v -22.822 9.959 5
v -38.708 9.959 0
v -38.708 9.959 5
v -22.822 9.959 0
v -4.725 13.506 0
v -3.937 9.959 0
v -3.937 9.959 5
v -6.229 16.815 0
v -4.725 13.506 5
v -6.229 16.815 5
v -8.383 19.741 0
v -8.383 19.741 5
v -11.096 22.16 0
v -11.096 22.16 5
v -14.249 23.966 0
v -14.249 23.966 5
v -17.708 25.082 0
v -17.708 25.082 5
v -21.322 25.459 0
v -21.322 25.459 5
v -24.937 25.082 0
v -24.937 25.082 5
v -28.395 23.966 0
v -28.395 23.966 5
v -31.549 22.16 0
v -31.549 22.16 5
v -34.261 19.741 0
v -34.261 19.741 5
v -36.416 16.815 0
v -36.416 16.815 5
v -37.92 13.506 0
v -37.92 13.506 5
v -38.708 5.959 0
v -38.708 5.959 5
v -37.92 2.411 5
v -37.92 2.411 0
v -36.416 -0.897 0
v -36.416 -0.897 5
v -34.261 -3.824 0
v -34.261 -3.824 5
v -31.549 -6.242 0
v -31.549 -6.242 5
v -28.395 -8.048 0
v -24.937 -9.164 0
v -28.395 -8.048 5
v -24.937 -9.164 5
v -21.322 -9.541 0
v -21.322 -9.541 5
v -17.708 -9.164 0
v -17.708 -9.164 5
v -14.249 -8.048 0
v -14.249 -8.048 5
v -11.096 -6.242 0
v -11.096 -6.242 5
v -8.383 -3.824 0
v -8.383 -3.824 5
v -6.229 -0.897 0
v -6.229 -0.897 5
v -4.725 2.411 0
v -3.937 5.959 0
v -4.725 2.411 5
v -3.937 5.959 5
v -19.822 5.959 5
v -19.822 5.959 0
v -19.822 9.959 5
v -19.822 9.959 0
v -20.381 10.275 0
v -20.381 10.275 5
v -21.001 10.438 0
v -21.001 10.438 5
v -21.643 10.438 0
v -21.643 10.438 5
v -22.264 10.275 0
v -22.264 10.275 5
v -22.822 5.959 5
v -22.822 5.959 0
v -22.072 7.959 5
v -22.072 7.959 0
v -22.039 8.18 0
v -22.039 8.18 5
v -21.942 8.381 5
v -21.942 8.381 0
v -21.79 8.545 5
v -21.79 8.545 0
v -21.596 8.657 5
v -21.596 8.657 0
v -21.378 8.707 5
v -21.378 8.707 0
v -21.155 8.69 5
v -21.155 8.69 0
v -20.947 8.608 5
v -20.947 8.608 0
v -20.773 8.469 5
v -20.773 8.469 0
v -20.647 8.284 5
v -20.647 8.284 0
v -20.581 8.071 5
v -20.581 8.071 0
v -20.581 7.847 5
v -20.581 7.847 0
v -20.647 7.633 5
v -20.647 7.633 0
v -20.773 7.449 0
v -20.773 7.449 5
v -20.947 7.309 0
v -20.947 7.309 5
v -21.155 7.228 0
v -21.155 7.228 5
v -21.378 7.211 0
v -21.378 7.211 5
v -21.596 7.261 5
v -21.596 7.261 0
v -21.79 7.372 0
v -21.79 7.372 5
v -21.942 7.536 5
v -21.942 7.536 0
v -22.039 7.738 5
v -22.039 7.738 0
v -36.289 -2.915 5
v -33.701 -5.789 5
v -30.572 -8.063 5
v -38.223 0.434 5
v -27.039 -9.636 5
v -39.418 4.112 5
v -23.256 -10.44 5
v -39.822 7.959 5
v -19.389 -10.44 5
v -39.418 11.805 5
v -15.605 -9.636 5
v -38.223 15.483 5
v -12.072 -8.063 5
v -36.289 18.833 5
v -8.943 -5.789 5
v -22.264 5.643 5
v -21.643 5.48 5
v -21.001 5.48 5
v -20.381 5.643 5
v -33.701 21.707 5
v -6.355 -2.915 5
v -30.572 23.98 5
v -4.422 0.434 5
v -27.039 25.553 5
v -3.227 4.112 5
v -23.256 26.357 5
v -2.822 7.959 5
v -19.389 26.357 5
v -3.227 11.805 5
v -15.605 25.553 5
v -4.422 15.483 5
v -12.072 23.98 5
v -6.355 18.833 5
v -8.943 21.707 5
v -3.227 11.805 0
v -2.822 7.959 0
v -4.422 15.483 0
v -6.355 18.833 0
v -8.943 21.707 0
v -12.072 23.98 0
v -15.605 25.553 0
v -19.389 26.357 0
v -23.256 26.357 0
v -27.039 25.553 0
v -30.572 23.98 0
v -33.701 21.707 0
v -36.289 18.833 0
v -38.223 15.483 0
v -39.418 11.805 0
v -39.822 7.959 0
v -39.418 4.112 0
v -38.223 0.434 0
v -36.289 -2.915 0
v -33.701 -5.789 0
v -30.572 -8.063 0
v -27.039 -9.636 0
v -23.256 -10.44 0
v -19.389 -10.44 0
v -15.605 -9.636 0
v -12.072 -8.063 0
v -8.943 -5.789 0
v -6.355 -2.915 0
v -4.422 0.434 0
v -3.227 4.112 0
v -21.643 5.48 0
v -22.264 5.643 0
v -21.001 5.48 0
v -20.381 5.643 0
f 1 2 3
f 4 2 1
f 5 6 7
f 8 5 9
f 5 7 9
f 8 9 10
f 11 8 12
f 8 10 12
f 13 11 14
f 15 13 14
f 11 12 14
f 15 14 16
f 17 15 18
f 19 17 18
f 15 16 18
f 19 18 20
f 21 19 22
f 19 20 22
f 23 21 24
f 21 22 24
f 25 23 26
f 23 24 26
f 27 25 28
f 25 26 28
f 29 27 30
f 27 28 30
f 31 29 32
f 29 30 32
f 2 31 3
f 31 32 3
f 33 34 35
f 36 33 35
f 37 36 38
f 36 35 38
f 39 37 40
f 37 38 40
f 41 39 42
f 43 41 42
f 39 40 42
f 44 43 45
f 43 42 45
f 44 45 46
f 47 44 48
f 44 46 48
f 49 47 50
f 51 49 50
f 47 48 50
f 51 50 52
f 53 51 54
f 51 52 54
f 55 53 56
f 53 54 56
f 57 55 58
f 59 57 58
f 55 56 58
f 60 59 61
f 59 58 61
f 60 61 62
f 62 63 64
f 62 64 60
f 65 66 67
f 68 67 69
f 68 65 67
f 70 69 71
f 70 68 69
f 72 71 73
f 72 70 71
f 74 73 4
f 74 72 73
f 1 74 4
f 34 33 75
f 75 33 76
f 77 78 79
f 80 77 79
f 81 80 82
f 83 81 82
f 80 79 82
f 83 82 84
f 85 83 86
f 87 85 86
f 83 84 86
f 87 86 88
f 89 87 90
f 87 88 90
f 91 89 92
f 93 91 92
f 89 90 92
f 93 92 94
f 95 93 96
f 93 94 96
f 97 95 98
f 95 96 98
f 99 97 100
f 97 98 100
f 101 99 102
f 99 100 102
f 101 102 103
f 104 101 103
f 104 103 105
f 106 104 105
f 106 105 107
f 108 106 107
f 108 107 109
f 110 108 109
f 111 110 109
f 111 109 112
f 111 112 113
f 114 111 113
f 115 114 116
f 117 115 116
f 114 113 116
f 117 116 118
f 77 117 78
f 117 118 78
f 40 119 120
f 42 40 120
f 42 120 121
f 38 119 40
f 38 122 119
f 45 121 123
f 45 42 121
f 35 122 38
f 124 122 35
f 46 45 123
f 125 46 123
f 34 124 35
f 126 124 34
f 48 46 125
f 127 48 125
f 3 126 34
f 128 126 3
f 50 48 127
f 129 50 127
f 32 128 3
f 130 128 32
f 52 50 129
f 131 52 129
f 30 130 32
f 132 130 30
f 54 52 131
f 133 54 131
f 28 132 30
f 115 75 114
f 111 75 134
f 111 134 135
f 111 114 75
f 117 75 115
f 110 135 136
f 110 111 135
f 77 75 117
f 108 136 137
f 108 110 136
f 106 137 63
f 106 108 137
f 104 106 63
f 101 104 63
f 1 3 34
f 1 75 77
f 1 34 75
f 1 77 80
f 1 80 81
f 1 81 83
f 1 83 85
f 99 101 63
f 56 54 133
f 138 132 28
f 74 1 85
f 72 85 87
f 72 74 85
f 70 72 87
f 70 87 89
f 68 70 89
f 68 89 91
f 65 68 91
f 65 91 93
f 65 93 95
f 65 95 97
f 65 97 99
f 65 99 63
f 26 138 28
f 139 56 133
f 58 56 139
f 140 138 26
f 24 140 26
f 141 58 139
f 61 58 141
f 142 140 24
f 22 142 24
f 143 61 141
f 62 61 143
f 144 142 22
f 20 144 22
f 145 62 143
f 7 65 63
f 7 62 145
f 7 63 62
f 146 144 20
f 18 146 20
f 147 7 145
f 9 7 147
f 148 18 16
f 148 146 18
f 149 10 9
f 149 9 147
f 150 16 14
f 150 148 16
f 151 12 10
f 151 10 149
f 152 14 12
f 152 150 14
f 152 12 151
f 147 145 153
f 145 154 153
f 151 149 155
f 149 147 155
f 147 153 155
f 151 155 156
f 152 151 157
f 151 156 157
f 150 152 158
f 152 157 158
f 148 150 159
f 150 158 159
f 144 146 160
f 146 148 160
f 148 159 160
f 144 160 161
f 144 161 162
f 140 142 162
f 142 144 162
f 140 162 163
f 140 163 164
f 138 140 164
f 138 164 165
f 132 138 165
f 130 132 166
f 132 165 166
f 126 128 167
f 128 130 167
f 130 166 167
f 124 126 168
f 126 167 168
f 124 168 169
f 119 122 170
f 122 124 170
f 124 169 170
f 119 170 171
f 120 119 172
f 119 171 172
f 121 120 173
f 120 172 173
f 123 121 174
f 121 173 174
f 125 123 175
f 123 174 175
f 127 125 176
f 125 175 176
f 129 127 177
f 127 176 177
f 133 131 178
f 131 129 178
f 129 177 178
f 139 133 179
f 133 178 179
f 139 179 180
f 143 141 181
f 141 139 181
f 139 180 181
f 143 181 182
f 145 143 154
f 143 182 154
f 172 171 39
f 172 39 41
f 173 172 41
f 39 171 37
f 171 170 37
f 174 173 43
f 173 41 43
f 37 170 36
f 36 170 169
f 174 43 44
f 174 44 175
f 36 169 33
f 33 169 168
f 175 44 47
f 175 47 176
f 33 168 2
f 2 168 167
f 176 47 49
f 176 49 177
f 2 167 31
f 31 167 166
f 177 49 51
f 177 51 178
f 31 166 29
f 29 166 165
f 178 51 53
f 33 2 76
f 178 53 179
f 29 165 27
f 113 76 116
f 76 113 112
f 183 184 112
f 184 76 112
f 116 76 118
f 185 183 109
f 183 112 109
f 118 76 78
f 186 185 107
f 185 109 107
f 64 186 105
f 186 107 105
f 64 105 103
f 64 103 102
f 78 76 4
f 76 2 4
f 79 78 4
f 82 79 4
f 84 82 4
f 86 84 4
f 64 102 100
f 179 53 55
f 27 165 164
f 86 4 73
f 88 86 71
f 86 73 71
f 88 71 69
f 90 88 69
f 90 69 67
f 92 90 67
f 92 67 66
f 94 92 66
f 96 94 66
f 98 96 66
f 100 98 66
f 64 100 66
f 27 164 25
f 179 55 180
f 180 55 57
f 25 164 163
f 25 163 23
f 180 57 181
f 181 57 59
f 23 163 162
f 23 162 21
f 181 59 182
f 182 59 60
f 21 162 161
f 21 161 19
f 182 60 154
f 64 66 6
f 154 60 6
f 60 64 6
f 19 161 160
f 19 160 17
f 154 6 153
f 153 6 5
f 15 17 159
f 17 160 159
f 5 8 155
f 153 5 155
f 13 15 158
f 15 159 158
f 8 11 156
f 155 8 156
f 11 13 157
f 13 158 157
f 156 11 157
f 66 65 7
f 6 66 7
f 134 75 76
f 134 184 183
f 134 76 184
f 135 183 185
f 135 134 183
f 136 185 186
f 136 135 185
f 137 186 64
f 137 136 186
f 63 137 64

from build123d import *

# Parameters (mm, degrees)
CROQUIS1_R               = 18.5
SALIENTE_EXTRUIR1_DEPTH  = 5
CROQUIS2_R               = 0.75
CORTAR_EXTRUIR1_DEPTH    = 5
CROQUIS3_R               = 17.5
CROQUIS3_R_2             = 2.5
CORTAR_EXTRUIR4_DEPTH    = 5
SALIENTE_EXTRUIR11_START = -5
CROQUIS6_W               = 17.427059278
CROQUIS6_H               = 4
SALIENTE_EXTRUIR11_DEPTH = 5
CROQUIS8_W               = 17.261171747
CROQUIS8_H               = 4
SALIENTE_EXTRUIR12_DEPTH = 5


with BuildPart() as part:
    # Croquis1 → Saliente-Extruir1 (new body)
    with BuildSketch(Plane.XY):
        with Locations((-21.322301086, 7.958835432)):
            Circle(CROQUIS1_R)
    extrude(amount=SALIENTE_EXTRUIR1_DEPTH)

    # Croquis2 → Cortar-Extruir1 (cut)
    with BuildSketch(Plane(origin=(0, 0, 0), x_dir=(-1, 0, 0), z_dir=(0, 0, -1))):
        with Locations((21.322301086, 7.958835432)):
            Circle(CROQUIS2_R)
    extrude(amount=-CORTAR_EXTRUIR1_DEPTH, mode=Mode.SUBTRACT)

    # Croquis3 → Cortar-Extruir4 (cut)
    with BuildSketch(Plane.XY.offset(5)):
        with Locations((-21.322301086, 7.958835432)):
            Circle(CROQUIS3_R)
        with Locations((-21.322301086, 7.958835432)):
            Circle(CROQUIS3_R_2, mode=Mode.SUBTRACT)
    extrude(amount=-CORTAR_EXTRUIR4_DEPTH, mode=Mode.SUBTRACT)


with BuildPart() as cortar_extruir4_piece_1:
    # of the separate pieces the step leaves, piece 1, a body of its own (cortar_extruir4_pieces)
    add(part.part.solids().sort_by_distance((-2.822301086, 7.958835432, 0))[0])



with BuildPart() as cortar_extruir4_piece_2:
    # of the separate pieces the step leaves, piece 2, a body of its own (cortar_extruir4_pieces)
    add(part.part.solids().sort_by_distance((-18.822301086, 7.958835432, 0))[0])


with BuildPart() as cortar_extruir4_piece_1_1:
    add(cortar_extruir4_piece_1.part)

    add(cortar_extruir4_piece_2.part)  # Saliente-Extruir11 merges Cortar-Extruir4 piece 2
    # Croquis6 → Saliente-Extruir11 (add)
    with BuildSketch(Plane.XY.offset(5).offset(SALIENTE_EXTRUIR11_START)):
        with Locations((-31.000345605, 7.958835432)):
            Rectangle(CROQUIS6_W, CROQUIS6_H)
    extrude(amount=SALIENTE_EXTRUIR11_DEPTH)

    # Croquis8 → Saliente-Extruir12 (add)
    with BuildSketch(Plane.XY.offset(5)):
        with Locations((-11.561312802, 7.958835432)):
            Rectangle(CROQUIS8_W, CROQUIS8_H)
    extrude(amount=-SALIENTE_EXTRUIR12_DEPTH)


solid = cortar_extruir4_piece_1_1.part
